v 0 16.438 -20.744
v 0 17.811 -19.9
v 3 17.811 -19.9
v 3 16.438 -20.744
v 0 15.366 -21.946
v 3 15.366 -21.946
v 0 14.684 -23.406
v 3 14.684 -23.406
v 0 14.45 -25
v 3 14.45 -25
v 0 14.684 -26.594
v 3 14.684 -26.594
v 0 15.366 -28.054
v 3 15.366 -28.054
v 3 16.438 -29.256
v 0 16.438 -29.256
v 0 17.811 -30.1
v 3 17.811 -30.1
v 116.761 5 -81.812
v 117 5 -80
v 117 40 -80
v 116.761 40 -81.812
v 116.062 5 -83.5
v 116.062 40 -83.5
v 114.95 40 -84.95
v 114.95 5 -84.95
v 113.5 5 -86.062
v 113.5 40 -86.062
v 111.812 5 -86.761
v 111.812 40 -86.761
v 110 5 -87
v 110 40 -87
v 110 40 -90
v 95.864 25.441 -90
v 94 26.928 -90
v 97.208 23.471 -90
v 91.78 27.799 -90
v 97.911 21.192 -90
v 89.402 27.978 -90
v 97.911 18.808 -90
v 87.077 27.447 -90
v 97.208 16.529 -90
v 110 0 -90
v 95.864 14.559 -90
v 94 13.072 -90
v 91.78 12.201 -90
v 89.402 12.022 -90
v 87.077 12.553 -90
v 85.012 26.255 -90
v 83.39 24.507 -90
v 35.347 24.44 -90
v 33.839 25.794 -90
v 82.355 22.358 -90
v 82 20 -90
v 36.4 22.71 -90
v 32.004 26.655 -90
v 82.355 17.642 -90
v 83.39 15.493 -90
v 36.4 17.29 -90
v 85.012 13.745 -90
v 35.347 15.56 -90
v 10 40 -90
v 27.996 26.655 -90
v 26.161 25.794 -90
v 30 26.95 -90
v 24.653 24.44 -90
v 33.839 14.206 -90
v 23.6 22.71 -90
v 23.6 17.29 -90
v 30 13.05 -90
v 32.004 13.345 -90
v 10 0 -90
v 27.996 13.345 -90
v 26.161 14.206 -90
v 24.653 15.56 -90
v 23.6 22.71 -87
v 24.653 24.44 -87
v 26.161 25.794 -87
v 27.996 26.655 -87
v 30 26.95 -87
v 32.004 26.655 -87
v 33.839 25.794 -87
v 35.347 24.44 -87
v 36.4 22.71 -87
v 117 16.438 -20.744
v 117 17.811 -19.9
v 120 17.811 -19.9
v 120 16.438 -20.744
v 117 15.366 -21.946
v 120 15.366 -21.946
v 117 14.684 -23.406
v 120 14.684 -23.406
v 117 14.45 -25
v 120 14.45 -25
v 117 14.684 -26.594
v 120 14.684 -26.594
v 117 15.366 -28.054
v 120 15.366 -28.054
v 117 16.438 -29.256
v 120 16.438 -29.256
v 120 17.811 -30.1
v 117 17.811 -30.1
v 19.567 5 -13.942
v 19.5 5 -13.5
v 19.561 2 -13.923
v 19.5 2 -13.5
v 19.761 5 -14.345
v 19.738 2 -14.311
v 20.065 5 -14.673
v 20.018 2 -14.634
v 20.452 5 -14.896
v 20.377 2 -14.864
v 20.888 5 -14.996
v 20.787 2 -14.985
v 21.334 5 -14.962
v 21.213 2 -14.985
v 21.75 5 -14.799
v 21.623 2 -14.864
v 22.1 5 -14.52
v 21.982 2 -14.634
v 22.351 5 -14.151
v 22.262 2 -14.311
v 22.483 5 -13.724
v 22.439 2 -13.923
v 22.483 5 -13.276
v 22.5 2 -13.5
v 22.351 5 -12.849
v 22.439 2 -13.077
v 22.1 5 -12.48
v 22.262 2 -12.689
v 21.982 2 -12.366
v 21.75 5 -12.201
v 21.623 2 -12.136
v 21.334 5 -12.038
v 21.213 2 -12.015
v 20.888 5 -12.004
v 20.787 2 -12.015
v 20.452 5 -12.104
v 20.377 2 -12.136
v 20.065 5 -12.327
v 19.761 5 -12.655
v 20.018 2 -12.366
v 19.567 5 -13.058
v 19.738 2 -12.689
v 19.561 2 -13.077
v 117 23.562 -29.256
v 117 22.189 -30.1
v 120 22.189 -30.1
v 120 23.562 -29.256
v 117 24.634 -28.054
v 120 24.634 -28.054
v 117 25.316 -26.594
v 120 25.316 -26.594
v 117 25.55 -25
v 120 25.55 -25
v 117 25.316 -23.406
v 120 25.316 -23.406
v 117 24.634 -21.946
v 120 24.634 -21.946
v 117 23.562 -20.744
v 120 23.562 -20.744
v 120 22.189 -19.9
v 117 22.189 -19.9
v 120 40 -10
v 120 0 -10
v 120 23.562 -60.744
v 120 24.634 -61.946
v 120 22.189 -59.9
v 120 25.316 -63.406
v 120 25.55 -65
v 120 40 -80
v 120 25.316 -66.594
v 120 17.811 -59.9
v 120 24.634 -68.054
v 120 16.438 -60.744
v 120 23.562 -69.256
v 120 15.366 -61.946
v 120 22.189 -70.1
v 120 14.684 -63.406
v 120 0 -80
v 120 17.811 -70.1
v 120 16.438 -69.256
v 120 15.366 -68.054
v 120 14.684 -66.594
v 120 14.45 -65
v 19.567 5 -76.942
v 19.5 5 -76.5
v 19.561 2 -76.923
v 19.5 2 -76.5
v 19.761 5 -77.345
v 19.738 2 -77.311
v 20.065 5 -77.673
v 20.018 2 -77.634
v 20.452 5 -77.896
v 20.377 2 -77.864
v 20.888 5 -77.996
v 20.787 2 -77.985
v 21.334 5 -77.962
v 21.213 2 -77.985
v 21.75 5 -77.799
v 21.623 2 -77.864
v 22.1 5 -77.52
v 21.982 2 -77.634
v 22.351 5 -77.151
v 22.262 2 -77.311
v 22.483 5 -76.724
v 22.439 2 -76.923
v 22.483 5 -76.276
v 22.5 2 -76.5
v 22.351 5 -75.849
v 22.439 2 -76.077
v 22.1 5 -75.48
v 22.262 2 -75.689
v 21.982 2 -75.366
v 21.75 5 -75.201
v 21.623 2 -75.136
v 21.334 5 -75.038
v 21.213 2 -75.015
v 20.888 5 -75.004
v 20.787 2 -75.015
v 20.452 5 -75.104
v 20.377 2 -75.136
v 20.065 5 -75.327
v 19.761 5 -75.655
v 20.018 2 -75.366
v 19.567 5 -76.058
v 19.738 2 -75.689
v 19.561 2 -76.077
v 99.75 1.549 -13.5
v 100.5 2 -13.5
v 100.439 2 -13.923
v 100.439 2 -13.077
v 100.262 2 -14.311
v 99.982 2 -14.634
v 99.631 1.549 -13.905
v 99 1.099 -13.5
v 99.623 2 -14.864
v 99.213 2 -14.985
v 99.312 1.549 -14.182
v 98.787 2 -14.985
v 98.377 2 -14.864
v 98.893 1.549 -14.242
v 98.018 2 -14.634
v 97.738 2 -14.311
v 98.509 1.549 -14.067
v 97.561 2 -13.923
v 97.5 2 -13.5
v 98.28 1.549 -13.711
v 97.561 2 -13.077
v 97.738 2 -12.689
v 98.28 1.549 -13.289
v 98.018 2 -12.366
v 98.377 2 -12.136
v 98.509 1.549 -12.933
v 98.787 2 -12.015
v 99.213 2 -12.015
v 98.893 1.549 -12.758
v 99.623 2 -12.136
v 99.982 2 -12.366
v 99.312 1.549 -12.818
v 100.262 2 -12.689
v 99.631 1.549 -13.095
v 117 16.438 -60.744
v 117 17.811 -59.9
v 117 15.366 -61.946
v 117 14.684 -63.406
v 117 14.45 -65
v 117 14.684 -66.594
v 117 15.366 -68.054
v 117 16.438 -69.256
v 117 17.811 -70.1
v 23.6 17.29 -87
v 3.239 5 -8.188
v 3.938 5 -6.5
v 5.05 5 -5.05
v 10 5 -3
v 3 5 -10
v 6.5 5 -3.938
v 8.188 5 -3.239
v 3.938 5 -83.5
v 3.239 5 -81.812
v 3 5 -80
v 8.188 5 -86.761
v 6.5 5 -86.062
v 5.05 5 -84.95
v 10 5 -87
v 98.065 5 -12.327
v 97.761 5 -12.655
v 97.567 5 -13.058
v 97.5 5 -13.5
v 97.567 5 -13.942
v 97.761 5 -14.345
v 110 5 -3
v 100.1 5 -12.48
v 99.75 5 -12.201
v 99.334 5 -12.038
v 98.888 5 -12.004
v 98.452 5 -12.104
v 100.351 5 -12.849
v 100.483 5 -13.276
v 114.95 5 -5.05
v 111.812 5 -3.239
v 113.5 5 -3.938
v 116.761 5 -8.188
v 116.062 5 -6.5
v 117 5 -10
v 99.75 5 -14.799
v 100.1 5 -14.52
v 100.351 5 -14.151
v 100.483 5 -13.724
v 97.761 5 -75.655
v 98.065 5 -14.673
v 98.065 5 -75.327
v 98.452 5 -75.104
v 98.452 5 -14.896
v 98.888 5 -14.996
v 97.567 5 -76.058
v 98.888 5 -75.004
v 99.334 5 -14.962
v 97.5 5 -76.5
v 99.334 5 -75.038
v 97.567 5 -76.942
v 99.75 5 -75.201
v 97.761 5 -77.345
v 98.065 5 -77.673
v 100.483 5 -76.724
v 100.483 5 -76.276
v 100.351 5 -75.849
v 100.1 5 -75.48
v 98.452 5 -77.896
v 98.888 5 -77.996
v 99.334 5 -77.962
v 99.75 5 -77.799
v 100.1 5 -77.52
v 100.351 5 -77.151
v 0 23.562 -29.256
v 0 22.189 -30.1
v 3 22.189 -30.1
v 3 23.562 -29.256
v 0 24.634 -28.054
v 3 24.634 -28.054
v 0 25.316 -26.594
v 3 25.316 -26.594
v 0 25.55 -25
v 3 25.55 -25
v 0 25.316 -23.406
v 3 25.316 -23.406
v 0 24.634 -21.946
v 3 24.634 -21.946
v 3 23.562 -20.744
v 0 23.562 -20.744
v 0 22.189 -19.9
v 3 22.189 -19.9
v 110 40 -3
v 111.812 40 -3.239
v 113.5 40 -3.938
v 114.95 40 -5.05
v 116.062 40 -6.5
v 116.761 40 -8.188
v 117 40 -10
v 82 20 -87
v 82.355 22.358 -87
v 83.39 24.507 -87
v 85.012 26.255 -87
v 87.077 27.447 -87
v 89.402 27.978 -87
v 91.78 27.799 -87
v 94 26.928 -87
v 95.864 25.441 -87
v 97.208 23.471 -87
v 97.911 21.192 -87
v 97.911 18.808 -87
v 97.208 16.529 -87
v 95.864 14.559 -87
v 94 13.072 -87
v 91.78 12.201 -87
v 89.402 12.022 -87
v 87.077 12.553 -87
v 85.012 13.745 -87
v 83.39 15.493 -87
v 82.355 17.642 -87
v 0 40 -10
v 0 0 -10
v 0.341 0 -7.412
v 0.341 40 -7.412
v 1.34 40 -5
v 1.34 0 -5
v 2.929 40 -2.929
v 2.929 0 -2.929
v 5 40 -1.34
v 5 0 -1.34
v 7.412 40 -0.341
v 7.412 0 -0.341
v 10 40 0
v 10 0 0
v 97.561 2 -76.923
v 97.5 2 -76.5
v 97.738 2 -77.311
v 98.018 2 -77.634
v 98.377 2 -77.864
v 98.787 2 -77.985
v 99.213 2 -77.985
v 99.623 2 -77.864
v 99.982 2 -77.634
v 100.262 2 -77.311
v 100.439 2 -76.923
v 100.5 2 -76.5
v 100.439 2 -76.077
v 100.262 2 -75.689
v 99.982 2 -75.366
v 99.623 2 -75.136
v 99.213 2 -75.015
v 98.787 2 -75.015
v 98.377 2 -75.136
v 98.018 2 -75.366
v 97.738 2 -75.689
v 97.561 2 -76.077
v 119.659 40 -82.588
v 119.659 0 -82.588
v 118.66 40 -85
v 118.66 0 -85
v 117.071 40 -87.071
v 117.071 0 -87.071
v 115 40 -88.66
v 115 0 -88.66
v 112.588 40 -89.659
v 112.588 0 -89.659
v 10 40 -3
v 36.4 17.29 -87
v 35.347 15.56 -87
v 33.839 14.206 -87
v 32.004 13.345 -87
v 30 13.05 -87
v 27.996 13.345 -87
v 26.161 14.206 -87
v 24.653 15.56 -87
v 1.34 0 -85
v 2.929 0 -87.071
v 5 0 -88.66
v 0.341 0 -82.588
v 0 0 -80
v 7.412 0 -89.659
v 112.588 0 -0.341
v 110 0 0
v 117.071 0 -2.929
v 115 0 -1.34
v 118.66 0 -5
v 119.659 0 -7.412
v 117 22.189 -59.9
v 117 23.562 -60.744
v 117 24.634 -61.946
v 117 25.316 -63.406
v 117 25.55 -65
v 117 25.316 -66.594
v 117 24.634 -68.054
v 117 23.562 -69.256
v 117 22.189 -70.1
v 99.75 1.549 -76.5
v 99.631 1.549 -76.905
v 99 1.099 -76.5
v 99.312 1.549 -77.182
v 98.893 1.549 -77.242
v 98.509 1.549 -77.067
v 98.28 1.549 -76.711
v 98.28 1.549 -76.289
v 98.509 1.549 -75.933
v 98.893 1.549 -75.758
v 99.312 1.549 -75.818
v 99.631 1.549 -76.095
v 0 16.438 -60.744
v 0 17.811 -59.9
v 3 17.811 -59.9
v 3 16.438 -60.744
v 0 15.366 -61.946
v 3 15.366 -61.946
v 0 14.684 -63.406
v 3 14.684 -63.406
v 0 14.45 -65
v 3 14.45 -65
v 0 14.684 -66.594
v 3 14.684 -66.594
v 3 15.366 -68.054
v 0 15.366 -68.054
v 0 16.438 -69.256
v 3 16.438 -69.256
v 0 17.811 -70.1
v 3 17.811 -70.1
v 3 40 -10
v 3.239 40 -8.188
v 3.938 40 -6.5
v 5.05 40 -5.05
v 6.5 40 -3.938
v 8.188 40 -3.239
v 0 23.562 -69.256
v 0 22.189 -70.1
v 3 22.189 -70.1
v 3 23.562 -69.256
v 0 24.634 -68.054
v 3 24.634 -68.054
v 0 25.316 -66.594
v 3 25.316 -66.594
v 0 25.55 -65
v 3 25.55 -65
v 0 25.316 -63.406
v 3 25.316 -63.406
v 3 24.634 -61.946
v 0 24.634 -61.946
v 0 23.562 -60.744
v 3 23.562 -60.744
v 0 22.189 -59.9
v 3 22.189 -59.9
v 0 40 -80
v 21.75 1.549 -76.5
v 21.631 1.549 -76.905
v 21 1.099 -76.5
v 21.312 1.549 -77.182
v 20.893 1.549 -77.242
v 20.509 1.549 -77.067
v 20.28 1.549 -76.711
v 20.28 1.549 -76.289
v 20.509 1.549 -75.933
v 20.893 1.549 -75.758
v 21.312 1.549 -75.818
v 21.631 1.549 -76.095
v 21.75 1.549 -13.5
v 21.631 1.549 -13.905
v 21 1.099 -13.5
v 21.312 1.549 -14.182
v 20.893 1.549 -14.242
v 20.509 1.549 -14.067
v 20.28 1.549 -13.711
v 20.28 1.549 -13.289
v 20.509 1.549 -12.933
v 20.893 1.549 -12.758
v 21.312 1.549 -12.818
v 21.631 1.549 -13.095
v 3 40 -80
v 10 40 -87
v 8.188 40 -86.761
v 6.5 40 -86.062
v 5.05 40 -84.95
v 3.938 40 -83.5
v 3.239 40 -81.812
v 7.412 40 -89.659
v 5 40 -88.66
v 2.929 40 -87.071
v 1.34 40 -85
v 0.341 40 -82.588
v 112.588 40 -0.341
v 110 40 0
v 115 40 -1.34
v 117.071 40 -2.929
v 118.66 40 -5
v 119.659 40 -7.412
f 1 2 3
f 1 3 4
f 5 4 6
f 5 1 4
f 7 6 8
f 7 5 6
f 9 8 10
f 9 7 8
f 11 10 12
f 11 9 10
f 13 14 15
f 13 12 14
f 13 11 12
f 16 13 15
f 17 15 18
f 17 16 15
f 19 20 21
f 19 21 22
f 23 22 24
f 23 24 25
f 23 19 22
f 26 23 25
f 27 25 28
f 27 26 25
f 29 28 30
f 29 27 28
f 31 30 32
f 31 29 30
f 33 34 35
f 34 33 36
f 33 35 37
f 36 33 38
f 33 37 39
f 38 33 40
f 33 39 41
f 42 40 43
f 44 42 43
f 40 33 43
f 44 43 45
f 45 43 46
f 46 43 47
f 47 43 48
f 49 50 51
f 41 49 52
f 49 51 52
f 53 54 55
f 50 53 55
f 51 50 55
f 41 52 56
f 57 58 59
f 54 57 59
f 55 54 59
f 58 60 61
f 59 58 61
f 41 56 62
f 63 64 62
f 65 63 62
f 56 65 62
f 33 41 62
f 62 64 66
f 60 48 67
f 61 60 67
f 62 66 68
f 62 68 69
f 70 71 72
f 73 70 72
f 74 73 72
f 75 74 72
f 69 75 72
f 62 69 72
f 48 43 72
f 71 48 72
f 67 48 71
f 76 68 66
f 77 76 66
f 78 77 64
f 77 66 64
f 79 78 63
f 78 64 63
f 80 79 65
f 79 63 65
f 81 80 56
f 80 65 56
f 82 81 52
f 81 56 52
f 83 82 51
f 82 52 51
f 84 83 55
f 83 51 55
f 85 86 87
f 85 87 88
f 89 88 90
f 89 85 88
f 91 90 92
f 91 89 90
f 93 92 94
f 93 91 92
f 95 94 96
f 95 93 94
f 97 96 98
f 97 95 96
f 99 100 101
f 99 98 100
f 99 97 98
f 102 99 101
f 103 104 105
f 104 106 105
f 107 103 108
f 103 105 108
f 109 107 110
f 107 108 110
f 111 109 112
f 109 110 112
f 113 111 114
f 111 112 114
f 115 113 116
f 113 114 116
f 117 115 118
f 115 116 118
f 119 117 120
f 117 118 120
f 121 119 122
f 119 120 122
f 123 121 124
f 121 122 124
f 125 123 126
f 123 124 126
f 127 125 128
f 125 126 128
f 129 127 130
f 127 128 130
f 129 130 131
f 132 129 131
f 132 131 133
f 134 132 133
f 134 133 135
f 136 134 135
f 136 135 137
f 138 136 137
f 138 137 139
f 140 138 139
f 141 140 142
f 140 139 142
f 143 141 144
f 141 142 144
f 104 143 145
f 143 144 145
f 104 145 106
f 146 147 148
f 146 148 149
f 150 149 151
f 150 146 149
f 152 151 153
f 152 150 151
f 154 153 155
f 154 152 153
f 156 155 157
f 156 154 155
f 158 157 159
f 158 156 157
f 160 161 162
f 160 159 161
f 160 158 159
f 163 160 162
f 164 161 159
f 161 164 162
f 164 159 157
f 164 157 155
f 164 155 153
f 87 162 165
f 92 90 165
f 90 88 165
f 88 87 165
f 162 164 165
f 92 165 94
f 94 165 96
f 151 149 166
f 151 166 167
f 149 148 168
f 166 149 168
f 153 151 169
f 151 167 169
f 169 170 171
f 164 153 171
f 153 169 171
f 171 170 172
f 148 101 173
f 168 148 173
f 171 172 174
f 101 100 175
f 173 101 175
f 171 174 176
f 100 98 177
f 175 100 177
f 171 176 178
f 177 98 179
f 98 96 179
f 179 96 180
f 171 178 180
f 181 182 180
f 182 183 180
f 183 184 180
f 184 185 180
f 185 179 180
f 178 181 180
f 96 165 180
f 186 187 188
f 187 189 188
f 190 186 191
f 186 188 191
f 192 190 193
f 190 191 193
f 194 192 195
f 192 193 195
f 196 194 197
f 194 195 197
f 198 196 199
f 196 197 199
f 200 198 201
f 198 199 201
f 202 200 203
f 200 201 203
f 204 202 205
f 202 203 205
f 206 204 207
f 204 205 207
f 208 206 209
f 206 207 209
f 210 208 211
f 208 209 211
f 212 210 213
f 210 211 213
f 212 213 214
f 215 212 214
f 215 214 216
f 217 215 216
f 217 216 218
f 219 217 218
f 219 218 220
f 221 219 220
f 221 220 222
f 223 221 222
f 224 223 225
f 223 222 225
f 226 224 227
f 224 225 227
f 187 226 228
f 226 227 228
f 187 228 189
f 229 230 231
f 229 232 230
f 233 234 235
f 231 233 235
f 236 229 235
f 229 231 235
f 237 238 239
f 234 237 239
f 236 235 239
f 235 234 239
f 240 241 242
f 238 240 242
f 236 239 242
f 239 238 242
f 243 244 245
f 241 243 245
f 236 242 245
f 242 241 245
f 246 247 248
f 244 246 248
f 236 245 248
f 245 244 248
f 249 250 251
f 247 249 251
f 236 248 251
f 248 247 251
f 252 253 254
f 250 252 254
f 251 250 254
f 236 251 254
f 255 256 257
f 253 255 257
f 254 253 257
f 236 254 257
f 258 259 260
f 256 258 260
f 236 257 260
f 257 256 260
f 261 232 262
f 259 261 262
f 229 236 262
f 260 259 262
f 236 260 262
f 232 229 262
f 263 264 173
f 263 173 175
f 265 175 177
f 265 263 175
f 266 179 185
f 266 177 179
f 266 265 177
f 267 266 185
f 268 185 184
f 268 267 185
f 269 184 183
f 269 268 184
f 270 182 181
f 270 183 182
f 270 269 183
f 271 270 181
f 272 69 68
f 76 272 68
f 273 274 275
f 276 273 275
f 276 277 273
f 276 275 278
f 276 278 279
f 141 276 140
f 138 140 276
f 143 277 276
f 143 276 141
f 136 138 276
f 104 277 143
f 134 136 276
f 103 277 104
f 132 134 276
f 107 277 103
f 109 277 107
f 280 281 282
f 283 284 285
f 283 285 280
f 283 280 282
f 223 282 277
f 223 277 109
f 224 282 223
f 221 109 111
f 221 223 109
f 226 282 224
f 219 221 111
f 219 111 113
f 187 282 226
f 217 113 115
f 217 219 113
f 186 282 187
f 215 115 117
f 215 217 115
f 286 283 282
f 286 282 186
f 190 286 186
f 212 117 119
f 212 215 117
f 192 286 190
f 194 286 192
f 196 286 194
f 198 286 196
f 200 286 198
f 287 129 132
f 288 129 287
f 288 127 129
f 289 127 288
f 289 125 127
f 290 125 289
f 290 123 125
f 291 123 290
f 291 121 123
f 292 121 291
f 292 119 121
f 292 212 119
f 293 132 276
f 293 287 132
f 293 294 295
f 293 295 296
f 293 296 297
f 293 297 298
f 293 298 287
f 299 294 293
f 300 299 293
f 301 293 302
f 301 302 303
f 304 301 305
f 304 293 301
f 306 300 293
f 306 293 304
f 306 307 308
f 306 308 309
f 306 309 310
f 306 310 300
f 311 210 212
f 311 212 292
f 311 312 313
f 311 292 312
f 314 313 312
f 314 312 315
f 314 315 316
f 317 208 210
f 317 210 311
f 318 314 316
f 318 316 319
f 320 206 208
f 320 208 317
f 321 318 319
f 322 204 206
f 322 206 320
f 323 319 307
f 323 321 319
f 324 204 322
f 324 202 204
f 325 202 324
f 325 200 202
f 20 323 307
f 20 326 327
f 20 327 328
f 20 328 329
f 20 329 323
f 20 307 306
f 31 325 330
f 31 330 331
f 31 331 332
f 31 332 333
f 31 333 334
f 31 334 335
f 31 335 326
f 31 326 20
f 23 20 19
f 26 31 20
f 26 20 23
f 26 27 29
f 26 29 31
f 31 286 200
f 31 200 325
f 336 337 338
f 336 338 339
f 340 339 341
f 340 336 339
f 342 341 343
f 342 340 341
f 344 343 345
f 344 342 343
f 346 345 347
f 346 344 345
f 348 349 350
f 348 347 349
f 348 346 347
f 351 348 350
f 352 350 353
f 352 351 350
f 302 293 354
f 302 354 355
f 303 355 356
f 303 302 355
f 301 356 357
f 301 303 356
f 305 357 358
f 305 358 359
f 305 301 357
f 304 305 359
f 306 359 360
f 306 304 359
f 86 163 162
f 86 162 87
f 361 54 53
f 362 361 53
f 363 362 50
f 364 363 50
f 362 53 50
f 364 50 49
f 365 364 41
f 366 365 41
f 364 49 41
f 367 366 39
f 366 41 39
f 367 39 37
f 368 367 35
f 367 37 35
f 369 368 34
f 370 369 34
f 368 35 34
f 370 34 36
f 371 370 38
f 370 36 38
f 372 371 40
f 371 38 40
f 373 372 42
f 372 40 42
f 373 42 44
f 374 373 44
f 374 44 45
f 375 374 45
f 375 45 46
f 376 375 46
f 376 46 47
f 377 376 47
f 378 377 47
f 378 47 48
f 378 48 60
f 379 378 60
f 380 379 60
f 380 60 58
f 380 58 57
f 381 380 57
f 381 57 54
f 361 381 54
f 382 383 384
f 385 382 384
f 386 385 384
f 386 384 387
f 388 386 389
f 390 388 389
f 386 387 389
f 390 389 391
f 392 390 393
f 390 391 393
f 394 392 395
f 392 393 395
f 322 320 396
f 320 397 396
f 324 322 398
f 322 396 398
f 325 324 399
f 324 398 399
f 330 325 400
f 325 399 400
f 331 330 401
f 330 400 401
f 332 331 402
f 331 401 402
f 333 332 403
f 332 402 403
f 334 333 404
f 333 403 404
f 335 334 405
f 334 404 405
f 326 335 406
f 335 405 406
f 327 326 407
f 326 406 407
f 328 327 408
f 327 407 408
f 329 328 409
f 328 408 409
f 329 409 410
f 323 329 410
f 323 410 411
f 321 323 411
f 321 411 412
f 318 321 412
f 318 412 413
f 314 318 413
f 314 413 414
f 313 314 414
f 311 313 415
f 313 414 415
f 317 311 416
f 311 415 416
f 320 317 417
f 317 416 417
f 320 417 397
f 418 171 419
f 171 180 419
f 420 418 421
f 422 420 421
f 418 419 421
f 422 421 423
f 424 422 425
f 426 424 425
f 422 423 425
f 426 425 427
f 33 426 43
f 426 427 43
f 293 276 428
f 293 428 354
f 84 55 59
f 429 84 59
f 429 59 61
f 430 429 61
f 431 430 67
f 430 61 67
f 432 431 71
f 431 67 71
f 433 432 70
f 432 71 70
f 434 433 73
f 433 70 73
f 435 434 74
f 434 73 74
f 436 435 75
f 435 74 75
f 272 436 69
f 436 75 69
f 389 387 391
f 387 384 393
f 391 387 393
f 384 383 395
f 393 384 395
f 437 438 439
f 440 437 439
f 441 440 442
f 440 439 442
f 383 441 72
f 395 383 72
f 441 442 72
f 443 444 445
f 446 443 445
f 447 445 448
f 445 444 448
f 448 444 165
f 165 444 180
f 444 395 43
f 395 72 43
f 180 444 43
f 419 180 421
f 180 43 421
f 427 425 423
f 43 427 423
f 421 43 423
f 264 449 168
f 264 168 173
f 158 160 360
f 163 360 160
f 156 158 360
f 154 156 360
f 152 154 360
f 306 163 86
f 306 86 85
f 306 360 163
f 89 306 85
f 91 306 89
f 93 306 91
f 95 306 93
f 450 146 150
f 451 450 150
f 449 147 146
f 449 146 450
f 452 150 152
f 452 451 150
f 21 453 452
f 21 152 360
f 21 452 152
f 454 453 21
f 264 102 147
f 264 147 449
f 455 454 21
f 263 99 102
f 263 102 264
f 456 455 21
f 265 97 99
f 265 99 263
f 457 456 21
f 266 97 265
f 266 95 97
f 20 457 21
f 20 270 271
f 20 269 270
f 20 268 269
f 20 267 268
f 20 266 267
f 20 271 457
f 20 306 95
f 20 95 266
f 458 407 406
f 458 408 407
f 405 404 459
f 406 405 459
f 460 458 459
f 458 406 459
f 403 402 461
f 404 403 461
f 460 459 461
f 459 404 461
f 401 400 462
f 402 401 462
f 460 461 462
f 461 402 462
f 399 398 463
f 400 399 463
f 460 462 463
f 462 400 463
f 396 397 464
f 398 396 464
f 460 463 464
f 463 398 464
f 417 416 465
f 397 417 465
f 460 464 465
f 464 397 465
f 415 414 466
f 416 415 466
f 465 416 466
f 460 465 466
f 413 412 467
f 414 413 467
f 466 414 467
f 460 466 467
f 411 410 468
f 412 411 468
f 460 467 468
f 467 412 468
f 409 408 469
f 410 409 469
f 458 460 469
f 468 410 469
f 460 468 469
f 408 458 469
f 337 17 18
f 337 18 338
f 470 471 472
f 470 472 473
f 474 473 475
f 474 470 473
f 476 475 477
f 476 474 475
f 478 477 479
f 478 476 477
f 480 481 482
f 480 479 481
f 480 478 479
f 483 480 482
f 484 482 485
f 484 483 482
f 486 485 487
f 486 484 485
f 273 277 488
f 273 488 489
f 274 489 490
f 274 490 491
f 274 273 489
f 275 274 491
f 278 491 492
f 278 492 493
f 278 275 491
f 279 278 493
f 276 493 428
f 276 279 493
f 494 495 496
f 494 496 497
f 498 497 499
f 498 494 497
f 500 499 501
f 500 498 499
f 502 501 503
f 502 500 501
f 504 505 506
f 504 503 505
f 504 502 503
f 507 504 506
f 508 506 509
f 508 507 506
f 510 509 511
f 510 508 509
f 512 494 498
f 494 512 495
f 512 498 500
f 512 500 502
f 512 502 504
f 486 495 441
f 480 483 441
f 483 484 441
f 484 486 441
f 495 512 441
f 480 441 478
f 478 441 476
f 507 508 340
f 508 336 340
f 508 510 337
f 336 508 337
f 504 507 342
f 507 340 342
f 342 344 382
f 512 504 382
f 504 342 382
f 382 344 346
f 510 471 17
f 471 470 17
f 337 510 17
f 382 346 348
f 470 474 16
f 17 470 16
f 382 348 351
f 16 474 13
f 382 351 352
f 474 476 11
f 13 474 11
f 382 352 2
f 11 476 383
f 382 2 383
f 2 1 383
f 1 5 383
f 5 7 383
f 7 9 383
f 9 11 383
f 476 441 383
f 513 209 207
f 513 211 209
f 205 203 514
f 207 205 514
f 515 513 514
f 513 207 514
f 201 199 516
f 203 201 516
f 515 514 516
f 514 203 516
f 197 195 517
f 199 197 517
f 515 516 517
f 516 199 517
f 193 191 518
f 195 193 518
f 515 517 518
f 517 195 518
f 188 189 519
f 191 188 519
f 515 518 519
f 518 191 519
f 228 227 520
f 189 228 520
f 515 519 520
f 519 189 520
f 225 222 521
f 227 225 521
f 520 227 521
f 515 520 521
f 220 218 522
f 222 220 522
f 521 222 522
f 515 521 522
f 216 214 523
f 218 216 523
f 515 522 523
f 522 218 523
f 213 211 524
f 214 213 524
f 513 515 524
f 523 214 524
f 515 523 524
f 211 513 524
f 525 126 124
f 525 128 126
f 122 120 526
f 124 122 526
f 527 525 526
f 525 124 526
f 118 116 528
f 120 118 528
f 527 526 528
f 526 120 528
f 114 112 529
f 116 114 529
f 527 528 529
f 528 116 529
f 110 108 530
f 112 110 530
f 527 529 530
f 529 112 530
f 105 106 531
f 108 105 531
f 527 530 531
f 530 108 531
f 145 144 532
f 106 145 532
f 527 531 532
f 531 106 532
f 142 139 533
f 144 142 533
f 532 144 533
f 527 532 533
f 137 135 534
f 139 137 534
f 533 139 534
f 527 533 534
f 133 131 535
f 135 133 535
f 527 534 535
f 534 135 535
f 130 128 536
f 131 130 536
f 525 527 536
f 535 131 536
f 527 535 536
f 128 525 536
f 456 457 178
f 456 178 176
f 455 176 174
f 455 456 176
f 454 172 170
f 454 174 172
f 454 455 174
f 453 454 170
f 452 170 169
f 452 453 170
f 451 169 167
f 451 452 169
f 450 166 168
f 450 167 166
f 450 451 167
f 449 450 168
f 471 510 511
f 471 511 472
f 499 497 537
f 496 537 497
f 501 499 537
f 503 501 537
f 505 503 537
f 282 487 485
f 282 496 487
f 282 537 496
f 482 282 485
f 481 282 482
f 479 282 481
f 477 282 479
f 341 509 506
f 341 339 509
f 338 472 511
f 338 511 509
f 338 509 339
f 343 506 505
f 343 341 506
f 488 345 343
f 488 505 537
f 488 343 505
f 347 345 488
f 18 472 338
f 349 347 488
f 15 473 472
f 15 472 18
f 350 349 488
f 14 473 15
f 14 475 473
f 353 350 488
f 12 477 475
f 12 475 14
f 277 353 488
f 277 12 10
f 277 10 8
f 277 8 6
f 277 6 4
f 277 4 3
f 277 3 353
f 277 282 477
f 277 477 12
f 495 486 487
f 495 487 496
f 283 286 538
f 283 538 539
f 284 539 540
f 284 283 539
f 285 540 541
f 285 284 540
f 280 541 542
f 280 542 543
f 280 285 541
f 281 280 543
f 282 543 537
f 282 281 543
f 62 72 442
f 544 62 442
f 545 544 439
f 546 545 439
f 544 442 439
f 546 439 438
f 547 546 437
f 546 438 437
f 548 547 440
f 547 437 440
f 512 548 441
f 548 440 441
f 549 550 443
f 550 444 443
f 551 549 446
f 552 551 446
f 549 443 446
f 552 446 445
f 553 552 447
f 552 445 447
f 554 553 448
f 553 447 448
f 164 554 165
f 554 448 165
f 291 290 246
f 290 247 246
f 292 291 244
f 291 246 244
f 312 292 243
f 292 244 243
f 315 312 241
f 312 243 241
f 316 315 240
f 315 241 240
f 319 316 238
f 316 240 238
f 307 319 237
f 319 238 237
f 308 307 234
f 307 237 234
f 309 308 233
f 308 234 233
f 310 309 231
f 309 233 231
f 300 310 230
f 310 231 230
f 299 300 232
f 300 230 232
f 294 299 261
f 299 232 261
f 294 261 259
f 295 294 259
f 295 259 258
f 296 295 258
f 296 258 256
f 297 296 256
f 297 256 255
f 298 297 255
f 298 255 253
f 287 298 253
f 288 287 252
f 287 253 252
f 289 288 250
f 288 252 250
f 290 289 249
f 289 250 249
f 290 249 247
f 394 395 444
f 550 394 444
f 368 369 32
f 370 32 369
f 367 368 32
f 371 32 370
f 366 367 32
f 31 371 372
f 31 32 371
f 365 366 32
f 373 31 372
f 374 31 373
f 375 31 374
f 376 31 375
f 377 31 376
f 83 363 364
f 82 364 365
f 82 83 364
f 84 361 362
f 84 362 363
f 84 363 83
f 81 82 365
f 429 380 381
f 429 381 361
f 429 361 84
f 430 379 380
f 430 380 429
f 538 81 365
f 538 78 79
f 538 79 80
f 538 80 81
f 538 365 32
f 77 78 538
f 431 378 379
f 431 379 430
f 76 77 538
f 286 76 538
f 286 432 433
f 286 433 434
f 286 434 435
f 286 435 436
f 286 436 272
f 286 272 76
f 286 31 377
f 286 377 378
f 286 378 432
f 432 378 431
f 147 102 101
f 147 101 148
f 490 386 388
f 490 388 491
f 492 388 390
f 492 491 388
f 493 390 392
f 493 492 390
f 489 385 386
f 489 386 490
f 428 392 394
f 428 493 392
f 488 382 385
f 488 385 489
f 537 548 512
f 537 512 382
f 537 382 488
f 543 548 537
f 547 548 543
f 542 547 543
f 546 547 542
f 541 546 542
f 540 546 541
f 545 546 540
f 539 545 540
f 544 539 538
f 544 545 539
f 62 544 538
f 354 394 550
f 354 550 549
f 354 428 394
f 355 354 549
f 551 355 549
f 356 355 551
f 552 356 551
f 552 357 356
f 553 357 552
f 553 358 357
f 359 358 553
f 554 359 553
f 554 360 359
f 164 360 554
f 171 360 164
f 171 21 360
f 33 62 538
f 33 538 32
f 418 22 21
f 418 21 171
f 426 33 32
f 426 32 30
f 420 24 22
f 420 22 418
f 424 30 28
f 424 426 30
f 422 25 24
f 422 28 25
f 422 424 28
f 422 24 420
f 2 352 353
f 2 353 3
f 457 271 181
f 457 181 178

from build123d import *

# Parameters (mm, degrees)
BOSS_EXTRUDE1_DEPTH          = 5
F_3_0_3_DIAMETER_HOLE1_D     = 3
F_3_0_3_DIAMETER_HOLE1_DEPTH = 3
F_3_0_3_DIAMETER_HOLE1_TIP   = 0.901290929
BOSS_EXTRUDE2_DEPTH          = 35
CUT_EXTRUDE1_DEPTH           = 149
CUT_EXTRUDE2_DEPTH           = 35
SKETCH10_R                   = 8
CUT_EXTRUDE3_DEPTH           = 35


with BuildPart() as part:
    # Sketch1 → Boss-Extrude1 (new body)
    with BuildSketch(Plane(origin=(0, 0, 0), x_dir=(1, 0, 0), z_dir=(0, 1, 0))):
        with BuildLine():
            Line((10, 0), (110, 0))
            ThreePointArc((110, 0), (117.071067812, 2.928932188), (120, 10))
            Line((120, 10), (120, 80))
            ThreePointArc((120, 80), (117.071067812, 87.071067812), (110, 90))
            Line((110, 90), (10, 90))
            ThreePointArc((10, 90), (2.928932188, 87.071067812), (0, 80))
            Line((0, 80), (0, 10))
            ThreePointArc((0, 10), (2.928932188, 2.928932188), (10, 0))
        make_face()
    extrude(amount=BOSS_EXTRUDE1_DEPTH)

    # Ø3.0 (3) Diameter Hole1
    with Locations(Plane(origin=(0, 5, 0), x_dir=(1, 0, 0), z_dir=(0, 1, 0))):
        with Locations((99, 76.5), (21, 76.5), (21, 13.5), (99, 13.5)):
            Hole(F_3_0_3_DIAMETER_HOLE1_D / 2, depth=F_3_0_3_DIAMETER_HOLE1_DEPTH)
            with Locations((0, 0, -(F_3_0_3_DIAMETER_HOLE1_DEPTH + F_3_0_3_DIAMETER_HOLE1_TIP / 2))):  # 118° drill point
                Cone(0, F_3_0_3_DIAMETER_HOLE1_D / 2, F_3_0_3_DIAMETER_HOLE1_TIP, mode=Mode.SUBTRACT)

    # Sketch7 → Boss-Extrude2 (add)
    with BuildSketch(Plane(origin=(0, 5, 0), x_dir=(1, 0, 0), z_dir=(0, 1, 0))):
        with BuildLine():
            Line((10, 0), (110, 0))
            ThreePointArc((110, 0), (117.071067812, 2.928932188), (120, 10))
            Line((120, 10), (120, 80))
            ThreePointArc((120, 80), (117.071067812, 87.071067812), (110, 90))
            Line((110, 90), (10, 90))
            ThreePointArc((10, 90), (2.928932188, 87.071067812), (0, 80))
            Line((0, 80), (0, 10))
            ThreePointArc((0, 10), (2.928932188, 2.928932188), (10, 0))
        make_face()
        with BuildLine():
            Line((3, 80), (3, 10))
            ThreePointArc((3, 10), (5.050252532, 5.050252532), (10, 3))
            Line((10, 3), (110, 3))
            ThreePointArc((110, 3), (114.949747468, 5.050252532), (117, 10))
            Line((117, 10), (117, 80))
            ThreePointArc((117, 80), (114.949747468, 84.949747468), (110, 87))
            Line((110, 87), (10, 87))
            ThreePointArc((10, 87), (5.050252532, 84.949747468), (3, 80))
        make_face(mode=Mode.SUBTRACT)
    extrude(amount=BOSS_EXTRUDE2_DEPTH)

    # Sketch8 → Cut-Extrude1 (cut)
    with BuildSketch(Plane.ZY):
        with BuildLine():
            Line((-59.9, 22.189177928), (-59.9, 17.810822072))
            ThreePointArc((-59.9, 17.810822072), (-65, 14.45), (-70.1, 17.810822072))
            Line((-70.1, 17.810822072), (-70.1, 22.189177928))
            ThreePointArc((-70.1, 22.189177928), (-65, 25.55), (-59.9, 22.189177928))
        make_face()
        with BuildLine():
            Line((-19.9, 22.189177928), (-19.9, 17.810822072))
            ThreePointArc((-19.9, 17.810822072), (-25, 14.45), (-30.1, 17.810822072))
            Line((-30.1, 17.810822072), (-30.1, 22.189177928))
            ThreePointArc((-30.1, 22.189177928), (-25, 25.55), (-19.9, 22.189177928))
        make_face()
    extrude(amount=-CUT_EXTRUDE1_DEPTH, mode=Mode.SUBTRACT)

    # Sketch9 → Cut-Extrude2 (cut)
    with BuildSketch(Plane(origin=(0, 0, -90), x_dir=(-1, 0, 0), z_dir=(0, 0, -1))):
        with BuildLine():
            Line((-36.4, 22.709704781), (-36.4, 17.290295219))
            ThreePointArc((-36.4, 17.290295219), (-30, 13.05), (-23.6, 17.290295219))
            Line((-23.6, 17.290295219), (-23.6, 22.709704781))
            ThreePointArc((-23.6, 22.709704781), (-30, 26.95), (-36.4, 22.709704781))
        make_face()
    extrude(amount=-CUT_EXTRUDE2_DEPTH, mode=Mode.SUBTRACT)

    # Sketch10 → Cut-Extrude3 (cut)
    with BuildSketch(Plane(origin=(0, 0, -90), x_dir=(-1, 0, 0), z_dir=(0, 0, -1))):
        with Locations((-90, 20)):
            Circle(SKETCH10_R)
    extrude(amount=-CUT_EXTRUDE3_DEPTH, mode=Mode.SUBTRACT)


solid = part.part
